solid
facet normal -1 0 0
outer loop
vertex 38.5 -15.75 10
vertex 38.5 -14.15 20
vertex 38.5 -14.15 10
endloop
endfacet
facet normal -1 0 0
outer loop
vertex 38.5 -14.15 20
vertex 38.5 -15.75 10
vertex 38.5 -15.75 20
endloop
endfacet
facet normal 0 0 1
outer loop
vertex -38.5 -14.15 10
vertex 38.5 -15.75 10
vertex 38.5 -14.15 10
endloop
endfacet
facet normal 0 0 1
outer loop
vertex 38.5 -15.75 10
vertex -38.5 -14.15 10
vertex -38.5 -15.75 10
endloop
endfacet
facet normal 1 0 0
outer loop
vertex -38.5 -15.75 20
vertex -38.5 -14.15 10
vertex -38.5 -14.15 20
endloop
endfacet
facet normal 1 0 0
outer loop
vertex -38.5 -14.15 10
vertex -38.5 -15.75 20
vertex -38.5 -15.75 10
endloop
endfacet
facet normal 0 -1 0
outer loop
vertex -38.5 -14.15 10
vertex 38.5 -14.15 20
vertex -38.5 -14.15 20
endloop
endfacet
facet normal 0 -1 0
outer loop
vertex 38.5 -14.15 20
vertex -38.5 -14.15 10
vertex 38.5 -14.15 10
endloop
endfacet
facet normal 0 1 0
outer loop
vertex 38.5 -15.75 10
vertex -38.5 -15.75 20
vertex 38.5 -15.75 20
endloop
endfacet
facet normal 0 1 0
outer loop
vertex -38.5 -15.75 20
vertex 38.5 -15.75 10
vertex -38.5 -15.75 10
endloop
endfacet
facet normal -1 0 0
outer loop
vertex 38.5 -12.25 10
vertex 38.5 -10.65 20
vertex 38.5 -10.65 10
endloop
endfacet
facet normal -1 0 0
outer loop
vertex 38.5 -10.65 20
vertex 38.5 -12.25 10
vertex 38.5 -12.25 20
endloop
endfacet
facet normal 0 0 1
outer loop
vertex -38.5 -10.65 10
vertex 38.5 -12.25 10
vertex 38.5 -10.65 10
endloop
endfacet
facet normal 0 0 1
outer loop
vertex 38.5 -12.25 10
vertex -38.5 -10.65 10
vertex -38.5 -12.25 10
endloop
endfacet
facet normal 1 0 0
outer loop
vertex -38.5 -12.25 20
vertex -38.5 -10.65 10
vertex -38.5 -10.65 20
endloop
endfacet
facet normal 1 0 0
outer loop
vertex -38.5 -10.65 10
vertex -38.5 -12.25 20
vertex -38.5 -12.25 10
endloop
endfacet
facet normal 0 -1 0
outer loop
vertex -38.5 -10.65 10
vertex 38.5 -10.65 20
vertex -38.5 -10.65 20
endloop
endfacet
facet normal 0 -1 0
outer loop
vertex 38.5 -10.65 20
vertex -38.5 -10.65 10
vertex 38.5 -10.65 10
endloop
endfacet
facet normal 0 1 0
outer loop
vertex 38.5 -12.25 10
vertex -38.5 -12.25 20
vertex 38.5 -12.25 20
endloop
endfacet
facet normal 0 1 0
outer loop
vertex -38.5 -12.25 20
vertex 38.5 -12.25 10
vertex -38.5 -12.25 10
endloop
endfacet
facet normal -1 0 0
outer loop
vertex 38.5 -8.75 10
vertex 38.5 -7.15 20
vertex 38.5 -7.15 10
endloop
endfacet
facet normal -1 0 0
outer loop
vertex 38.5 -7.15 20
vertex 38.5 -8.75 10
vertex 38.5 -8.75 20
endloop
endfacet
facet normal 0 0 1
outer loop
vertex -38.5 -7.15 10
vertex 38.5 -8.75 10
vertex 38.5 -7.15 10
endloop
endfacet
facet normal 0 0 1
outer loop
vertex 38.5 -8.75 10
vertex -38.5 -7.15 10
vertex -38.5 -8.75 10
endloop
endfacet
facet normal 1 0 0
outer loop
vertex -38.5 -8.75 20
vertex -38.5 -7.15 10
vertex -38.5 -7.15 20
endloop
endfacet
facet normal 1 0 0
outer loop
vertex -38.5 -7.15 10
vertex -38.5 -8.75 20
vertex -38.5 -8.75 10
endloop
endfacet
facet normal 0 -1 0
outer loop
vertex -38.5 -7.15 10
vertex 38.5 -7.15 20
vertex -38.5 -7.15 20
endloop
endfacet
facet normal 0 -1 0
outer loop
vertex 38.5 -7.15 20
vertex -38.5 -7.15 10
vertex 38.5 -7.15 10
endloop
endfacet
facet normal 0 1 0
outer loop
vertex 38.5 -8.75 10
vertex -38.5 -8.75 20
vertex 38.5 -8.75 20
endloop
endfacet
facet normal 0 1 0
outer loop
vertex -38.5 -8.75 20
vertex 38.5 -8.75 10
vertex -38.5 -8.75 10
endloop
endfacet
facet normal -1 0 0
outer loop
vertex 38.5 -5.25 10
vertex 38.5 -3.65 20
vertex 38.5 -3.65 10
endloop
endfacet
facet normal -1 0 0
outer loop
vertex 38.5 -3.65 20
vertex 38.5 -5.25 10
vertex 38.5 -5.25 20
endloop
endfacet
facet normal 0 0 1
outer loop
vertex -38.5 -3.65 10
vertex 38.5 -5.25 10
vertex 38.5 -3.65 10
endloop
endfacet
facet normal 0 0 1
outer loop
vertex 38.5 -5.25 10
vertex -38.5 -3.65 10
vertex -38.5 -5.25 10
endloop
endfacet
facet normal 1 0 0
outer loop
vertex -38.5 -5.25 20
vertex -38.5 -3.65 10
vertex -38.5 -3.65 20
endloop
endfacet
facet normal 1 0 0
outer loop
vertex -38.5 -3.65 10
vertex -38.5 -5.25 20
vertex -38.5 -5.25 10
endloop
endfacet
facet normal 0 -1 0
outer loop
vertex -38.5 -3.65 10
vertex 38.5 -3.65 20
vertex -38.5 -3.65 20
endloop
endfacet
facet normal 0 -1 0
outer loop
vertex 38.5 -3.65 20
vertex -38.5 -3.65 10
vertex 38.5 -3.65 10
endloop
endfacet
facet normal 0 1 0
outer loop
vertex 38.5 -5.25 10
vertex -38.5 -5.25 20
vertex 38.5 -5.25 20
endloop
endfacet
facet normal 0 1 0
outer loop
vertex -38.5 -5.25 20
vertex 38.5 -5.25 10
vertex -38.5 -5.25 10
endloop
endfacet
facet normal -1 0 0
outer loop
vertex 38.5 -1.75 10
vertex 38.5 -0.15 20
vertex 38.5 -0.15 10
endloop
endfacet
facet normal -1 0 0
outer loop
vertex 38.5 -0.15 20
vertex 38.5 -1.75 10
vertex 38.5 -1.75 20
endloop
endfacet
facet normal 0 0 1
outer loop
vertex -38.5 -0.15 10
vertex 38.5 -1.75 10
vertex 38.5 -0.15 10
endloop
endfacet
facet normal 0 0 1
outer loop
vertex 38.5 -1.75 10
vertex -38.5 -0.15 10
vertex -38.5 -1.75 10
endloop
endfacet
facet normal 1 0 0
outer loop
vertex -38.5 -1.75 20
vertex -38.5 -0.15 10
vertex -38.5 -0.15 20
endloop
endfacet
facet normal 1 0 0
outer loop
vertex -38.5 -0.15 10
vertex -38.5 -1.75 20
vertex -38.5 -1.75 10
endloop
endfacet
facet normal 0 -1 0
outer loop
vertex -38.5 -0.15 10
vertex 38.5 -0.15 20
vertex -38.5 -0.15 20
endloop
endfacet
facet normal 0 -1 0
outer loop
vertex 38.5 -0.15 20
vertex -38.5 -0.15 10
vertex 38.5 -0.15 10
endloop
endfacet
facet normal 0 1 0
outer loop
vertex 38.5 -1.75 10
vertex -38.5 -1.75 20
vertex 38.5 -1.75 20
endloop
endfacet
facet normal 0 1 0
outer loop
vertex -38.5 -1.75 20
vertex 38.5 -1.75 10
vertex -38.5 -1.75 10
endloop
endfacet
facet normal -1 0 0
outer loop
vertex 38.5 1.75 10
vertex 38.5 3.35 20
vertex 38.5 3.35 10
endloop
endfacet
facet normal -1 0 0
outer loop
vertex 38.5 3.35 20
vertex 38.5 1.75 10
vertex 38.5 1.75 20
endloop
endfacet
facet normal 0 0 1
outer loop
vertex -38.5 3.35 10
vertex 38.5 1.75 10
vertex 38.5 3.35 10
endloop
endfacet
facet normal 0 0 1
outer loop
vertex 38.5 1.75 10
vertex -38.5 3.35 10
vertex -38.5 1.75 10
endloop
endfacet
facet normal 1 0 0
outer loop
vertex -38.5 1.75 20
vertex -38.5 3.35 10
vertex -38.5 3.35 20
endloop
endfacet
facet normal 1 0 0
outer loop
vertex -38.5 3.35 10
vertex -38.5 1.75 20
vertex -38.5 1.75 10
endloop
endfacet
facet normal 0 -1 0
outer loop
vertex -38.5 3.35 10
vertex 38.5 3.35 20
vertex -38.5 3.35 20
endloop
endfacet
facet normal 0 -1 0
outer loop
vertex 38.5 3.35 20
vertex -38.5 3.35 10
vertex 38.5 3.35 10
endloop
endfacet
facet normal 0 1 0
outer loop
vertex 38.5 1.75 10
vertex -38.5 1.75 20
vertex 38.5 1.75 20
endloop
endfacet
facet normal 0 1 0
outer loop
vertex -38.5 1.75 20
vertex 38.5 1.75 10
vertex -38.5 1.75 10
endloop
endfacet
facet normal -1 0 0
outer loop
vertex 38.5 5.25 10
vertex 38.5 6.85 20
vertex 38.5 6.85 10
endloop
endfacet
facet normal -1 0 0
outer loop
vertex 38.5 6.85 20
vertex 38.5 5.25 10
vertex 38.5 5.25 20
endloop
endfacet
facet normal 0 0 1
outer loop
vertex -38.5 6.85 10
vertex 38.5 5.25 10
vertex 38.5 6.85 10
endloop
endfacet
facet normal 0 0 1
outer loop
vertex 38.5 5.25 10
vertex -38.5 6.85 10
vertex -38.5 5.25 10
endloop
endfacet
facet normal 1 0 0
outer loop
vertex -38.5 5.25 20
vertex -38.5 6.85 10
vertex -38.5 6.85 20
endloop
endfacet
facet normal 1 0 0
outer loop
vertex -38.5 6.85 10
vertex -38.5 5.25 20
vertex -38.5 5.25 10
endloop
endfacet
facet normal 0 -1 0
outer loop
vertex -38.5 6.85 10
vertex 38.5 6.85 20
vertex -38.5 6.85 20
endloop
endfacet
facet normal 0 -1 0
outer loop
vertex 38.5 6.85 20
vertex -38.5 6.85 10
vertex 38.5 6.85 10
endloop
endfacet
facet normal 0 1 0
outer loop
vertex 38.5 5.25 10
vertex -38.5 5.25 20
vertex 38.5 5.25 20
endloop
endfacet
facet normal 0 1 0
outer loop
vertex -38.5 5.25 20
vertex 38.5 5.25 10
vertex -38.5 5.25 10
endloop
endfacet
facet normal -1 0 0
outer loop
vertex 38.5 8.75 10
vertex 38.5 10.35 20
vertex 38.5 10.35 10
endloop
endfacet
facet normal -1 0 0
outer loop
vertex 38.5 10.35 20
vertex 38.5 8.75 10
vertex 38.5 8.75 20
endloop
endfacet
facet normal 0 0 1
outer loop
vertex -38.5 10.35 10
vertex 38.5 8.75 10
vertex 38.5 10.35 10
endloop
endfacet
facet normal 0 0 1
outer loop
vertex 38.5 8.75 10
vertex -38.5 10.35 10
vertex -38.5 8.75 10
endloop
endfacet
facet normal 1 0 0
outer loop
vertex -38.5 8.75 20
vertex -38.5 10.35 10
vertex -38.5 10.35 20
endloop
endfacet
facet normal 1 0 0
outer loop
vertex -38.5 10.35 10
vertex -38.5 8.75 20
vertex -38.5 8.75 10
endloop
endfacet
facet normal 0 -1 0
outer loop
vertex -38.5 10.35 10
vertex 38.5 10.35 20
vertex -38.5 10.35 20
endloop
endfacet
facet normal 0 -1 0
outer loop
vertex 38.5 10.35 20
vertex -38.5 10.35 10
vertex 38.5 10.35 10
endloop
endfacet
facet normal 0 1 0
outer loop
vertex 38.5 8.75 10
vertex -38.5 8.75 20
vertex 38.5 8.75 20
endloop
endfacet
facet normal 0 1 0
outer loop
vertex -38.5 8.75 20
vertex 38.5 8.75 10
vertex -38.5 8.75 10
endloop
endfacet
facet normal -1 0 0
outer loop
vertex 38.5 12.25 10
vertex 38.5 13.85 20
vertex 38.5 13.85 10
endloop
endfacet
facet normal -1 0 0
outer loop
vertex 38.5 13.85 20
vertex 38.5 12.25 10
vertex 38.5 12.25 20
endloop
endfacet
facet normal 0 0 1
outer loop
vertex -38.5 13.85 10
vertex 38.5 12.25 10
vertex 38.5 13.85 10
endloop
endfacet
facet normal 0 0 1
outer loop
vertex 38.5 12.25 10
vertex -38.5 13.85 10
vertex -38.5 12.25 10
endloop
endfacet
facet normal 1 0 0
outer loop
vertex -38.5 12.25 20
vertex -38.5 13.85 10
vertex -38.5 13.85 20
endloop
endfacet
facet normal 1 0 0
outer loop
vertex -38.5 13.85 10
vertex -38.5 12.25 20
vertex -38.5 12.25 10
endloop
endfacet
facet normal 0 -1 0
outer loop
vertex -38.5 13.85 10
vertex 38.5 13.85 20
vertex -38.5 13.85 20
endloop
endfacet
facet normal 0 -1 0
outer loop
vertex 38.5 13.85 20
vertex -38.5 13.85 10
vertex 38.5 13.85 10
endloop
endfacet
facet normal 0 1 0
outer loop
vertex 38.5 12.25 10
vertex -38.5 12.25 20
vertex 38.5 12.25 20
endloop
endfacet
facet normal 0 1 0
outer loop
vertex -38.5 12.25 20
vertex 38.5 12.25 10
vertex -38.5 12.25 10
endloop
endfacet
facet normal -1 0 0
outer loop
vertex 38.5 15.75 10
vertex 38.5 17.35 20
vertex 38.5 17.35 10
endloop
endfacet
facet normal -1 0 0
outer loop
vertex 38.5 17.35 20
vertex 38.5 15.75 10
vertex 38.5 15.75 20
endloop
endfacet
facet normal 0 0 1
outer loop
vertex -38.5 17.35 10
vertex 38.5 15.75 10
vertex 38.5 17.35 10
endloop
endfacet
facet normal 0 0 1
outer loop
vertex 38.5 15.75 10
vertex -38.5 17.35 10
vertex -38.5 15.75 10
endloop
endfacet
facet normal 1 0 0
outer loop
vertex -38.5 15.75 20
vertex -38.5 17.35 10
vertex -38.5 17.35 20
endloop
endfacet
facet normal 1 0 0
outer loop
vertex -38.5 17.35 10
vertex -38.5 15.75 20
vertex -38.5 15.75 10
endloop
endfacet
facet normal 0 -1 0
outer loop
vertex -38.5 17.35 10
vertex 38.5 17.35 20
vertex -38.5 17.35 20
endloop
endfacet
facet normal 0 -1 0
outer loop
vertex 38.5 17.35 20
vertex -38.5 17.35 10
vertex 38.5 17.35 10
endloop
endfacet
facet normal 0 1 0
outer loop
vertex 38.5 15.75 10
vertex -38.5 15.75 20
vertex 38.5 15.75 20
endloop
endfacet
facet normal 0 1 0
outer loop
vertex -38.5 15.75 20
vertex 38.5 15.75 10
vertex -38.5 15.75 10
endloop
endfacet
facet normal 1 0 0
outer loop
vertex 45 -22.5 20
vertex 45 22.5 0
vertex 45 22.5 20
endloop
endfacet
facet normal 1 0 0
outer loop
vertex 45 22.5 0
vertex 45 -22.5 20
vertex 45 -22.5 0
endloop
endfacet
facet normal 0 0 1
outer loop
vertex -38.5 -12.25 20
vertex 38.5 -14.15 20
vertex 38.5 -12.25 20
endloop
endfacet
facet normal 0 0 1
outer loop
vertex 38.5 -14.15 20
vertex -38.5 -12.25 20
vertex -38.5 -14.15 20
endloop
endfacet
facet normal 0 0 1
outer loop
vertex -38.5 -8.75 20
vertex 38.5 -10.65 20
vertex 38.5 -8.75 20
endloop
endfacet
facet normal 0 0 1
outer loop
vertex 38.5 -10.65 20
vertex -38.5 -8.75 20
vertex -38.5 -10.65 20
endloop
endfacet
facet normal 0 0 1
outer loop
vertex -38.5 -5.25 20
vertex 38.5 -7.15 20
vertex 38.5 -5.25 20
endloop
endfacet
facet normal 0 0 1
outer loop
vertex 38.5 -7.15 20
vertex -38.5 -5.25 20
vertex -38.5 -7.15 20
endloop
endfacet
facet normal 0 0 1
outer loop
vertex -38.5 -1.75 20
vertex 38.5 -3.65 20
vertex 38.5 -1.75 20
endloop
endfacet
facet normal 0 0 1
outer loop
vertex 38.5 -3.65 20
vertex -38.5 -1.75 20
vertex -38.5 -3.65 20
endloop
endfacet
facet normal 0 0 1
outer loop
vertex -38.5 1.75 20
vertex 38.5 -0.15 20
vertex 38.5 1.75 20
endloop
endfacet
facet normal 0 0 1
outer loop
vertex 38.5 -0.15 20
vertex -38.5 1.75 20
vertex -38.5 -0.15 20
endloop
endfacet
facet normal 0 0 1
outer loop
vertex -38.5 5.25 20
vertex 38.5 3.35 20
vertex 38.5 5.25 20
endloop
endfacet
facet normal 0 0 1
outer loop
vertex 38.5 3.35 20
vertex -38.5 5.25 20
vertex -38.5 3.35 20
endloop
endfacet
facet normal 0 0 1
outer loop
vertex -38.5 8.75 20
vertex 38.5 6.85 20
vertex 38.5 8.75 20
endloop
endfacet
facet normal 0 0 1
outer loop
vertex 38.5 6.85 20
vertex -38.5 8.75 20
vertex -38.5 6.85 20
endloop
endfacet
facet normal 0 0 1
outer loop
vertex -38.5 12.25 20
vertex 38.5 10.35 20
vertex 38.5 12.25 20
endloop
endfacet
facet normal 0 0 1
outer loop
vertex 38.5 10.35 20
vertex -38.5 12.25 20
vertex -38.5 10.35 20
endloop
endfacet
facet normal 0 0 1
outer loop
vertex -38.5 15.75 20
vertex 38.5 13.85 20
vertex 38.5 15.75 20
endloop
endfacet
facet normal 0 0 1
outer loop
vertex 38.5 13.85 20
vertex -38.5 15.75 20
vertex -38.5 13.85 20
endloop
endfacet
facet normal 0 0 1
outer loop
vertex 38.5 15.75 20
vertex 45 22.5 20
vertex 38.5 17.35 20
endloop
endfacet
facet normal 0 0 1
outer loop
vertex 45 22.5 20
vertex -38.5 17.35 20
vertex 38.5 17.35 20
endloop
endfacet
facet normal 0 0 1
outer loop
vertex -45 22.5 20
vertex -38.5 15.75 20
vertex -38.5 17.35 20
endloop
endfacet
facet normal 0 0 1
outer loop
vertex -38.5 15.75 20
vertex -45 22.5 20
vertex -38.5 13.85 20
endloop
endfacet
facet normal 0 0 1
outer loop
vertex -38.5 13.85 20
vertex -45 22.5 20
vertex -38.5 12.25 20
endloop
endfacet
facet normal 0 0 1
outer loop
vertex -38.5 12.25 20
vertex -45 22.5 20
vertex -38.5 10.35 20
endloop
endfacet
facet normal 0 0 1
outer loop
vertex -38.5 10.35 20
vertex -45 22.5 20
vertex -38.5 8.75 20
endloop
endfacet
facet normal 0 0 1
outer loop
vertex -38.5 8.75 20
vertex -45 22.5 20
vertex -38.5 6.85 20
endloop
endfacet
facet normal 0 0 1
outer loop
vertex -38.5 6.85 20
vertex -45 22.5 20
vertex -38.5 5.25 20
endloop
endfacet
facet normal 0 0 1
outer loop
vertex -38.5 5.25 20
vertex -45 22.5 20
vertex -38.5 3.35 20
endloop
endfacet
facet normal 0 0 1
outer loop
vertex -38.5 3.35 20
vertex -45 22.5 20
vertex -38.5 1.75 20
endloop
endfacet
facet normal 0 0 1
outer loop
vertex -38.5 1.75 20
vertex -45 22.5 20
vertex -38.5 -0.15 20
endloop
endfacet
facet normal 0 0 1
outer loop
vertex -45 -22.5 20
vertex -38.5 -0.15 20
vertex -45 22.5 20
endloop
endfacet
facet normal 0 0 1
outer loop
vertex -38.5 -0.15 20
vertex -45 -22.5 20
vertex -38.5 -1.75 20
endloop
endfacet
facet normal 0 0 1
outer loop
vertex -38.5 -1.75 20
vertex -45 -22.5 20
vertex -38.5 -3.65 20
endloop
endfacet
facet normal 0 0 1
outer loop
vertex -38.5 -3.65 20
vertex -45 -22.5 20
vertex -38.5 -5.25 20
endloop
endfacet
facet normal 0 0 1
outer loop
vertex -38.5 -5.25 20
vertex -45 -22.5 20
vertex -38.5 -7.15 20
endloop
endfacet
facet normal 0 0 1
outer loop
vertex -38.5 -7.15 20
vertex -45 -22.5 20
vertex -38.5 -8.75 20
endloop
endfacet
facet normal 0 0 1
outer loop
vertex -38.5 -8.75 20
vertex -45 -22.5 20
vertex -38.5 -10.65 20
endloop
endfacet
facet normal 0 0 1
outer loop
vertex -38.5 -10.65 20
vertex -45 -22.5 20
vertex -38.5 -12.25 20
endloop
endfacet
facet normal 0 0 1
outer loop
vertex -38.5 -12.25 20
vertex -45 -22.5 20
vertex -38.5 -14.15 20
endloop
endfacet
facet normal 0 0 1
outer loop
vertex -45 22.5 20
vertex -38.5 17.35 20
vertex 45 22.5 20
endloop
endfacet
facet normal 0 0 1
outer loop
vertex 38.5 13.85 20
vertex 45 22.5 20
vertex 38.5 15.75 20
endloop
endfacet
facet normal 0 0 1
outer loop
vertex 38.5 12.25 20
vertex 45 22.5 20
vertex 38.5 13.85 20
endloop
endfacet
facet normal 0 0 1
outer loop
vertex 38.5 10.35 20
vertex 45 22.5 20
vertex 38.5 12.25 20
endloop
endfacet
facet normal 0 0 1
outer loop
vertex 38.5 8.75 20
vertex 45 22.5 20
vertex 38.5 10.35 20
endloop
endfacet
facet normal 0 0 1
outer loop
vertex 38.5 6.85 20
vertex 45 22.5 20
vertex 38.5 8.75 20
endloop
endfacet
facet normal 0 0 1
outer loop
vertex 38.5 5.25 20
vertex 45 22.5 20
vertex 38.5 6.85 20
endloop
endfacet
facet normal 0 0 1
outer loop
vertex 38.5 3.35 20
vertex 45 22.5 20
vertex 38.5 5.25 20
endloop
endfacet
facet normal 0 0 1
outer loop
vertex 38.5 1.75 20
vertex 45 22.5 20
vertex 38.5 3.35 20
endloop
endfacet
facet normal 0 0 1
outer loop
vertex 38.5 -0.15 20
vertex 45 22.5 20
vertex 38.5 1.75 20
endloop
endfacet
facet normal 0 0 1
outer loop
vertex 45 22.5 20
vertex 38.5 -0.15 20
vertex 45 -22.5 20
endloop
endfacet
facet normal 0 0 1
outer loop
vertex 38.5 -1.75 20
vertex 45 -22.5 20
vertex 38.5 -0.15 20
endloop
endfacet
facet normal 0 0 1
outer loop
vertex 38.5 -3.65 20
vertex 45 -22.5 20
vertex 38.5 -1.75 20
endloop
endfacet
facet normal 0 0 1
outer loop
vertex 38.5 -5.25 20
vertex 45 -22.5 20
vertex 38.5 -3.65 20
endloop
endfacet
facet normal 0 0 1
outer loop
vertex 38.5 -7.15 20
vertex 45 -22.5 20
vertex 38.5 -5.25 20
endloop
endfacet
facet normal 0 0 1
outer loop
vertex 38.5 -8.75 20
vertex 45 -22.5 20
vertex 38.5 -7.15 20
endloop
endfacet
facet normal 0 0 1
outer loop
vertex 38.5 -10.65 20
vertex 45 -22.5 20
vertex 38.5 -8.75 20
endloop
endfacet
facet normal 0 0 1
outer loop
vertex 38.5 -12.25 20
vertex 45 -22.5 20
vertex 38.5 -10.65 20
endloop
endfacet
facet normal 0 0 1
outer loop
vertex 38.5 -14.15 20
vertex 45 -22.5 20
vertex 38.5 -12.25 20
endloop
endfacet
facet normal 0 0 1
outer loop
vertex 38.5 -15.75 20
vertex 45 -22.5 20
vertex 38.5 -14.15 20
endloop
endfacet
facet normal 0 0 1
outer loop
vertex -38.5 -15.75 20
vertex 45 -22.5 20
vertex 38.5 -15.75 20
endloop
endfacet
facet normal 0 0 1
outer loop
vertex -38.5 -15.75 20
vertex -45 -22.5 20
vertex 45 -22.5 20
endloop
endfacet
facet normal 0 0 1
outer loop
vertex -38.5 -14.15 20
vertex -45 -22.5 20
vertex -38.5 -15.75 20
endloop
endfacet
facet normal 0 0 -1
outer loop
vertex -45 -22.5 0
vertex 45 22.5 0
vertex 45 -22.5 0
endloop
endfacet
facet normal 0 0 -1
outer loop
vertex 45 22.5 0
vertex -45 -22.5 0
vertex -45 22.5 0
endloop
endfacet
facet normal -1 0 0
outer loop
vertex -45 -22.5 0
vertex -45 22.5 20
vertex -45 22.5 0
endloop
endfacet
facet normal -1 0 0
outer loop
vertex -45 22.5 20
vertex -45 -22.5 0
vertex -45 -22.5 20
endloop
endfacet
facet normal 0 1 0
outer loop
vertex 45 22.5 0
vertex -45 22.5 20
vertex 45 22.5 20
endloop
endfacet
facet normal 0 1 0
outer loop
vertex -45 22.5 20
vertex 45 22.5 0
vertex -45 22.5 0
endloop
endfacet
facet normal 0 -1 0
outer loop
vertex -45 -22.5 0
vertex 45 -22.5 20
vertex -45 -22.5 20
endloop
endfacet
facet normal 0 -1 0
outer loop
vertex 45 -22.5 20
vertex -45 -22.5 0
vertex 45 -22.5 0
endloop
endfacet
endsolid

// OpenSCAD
// Microscope slide drying rack
// Print orientation: base block on the bed (z = 0), slots open upward.

// ---------------- Parameters ----------------
block_len    = 90;    // base block length along X (mm)
block_wid    = 45;    // base block width along Y (mm)
block_h      = 20;    // base block height along Z (mm)

slot_count   = 10;    // number of slide slots
slot_len     = 77;    // slot length along X (mm)
slot_w       = 1.6;   // slot width along Y (mm)
slot_depth   = 10;    // slot depth into block from top face (mm)
slot_pitch   = 3.5;   // centre-to-centre slot spacing along Y (mm)

eps          = 0.5;   // overshoot so cutters pass cleanly through the top face (mm)

$fn = 64;

// ---------------- Model ----------------
difference() {
    // Base block, centred in X and Y, sitting on z = 0
    translate([-block_len/2, -block_wid/2, 0])
        cube([block_len, block_wid, block_h]);

    // Parallel slots running along X, centred as a group in X and Y
    for (i = [0 : slot_count - 1]) {
        y = (i - (slot_count - 1)/2) * slot_pitch;
        translate([-slot_len/2, y, block_h - slot_depth])
            cube([slot_len, slot_w, slot_depth + eps]);
    }
}
